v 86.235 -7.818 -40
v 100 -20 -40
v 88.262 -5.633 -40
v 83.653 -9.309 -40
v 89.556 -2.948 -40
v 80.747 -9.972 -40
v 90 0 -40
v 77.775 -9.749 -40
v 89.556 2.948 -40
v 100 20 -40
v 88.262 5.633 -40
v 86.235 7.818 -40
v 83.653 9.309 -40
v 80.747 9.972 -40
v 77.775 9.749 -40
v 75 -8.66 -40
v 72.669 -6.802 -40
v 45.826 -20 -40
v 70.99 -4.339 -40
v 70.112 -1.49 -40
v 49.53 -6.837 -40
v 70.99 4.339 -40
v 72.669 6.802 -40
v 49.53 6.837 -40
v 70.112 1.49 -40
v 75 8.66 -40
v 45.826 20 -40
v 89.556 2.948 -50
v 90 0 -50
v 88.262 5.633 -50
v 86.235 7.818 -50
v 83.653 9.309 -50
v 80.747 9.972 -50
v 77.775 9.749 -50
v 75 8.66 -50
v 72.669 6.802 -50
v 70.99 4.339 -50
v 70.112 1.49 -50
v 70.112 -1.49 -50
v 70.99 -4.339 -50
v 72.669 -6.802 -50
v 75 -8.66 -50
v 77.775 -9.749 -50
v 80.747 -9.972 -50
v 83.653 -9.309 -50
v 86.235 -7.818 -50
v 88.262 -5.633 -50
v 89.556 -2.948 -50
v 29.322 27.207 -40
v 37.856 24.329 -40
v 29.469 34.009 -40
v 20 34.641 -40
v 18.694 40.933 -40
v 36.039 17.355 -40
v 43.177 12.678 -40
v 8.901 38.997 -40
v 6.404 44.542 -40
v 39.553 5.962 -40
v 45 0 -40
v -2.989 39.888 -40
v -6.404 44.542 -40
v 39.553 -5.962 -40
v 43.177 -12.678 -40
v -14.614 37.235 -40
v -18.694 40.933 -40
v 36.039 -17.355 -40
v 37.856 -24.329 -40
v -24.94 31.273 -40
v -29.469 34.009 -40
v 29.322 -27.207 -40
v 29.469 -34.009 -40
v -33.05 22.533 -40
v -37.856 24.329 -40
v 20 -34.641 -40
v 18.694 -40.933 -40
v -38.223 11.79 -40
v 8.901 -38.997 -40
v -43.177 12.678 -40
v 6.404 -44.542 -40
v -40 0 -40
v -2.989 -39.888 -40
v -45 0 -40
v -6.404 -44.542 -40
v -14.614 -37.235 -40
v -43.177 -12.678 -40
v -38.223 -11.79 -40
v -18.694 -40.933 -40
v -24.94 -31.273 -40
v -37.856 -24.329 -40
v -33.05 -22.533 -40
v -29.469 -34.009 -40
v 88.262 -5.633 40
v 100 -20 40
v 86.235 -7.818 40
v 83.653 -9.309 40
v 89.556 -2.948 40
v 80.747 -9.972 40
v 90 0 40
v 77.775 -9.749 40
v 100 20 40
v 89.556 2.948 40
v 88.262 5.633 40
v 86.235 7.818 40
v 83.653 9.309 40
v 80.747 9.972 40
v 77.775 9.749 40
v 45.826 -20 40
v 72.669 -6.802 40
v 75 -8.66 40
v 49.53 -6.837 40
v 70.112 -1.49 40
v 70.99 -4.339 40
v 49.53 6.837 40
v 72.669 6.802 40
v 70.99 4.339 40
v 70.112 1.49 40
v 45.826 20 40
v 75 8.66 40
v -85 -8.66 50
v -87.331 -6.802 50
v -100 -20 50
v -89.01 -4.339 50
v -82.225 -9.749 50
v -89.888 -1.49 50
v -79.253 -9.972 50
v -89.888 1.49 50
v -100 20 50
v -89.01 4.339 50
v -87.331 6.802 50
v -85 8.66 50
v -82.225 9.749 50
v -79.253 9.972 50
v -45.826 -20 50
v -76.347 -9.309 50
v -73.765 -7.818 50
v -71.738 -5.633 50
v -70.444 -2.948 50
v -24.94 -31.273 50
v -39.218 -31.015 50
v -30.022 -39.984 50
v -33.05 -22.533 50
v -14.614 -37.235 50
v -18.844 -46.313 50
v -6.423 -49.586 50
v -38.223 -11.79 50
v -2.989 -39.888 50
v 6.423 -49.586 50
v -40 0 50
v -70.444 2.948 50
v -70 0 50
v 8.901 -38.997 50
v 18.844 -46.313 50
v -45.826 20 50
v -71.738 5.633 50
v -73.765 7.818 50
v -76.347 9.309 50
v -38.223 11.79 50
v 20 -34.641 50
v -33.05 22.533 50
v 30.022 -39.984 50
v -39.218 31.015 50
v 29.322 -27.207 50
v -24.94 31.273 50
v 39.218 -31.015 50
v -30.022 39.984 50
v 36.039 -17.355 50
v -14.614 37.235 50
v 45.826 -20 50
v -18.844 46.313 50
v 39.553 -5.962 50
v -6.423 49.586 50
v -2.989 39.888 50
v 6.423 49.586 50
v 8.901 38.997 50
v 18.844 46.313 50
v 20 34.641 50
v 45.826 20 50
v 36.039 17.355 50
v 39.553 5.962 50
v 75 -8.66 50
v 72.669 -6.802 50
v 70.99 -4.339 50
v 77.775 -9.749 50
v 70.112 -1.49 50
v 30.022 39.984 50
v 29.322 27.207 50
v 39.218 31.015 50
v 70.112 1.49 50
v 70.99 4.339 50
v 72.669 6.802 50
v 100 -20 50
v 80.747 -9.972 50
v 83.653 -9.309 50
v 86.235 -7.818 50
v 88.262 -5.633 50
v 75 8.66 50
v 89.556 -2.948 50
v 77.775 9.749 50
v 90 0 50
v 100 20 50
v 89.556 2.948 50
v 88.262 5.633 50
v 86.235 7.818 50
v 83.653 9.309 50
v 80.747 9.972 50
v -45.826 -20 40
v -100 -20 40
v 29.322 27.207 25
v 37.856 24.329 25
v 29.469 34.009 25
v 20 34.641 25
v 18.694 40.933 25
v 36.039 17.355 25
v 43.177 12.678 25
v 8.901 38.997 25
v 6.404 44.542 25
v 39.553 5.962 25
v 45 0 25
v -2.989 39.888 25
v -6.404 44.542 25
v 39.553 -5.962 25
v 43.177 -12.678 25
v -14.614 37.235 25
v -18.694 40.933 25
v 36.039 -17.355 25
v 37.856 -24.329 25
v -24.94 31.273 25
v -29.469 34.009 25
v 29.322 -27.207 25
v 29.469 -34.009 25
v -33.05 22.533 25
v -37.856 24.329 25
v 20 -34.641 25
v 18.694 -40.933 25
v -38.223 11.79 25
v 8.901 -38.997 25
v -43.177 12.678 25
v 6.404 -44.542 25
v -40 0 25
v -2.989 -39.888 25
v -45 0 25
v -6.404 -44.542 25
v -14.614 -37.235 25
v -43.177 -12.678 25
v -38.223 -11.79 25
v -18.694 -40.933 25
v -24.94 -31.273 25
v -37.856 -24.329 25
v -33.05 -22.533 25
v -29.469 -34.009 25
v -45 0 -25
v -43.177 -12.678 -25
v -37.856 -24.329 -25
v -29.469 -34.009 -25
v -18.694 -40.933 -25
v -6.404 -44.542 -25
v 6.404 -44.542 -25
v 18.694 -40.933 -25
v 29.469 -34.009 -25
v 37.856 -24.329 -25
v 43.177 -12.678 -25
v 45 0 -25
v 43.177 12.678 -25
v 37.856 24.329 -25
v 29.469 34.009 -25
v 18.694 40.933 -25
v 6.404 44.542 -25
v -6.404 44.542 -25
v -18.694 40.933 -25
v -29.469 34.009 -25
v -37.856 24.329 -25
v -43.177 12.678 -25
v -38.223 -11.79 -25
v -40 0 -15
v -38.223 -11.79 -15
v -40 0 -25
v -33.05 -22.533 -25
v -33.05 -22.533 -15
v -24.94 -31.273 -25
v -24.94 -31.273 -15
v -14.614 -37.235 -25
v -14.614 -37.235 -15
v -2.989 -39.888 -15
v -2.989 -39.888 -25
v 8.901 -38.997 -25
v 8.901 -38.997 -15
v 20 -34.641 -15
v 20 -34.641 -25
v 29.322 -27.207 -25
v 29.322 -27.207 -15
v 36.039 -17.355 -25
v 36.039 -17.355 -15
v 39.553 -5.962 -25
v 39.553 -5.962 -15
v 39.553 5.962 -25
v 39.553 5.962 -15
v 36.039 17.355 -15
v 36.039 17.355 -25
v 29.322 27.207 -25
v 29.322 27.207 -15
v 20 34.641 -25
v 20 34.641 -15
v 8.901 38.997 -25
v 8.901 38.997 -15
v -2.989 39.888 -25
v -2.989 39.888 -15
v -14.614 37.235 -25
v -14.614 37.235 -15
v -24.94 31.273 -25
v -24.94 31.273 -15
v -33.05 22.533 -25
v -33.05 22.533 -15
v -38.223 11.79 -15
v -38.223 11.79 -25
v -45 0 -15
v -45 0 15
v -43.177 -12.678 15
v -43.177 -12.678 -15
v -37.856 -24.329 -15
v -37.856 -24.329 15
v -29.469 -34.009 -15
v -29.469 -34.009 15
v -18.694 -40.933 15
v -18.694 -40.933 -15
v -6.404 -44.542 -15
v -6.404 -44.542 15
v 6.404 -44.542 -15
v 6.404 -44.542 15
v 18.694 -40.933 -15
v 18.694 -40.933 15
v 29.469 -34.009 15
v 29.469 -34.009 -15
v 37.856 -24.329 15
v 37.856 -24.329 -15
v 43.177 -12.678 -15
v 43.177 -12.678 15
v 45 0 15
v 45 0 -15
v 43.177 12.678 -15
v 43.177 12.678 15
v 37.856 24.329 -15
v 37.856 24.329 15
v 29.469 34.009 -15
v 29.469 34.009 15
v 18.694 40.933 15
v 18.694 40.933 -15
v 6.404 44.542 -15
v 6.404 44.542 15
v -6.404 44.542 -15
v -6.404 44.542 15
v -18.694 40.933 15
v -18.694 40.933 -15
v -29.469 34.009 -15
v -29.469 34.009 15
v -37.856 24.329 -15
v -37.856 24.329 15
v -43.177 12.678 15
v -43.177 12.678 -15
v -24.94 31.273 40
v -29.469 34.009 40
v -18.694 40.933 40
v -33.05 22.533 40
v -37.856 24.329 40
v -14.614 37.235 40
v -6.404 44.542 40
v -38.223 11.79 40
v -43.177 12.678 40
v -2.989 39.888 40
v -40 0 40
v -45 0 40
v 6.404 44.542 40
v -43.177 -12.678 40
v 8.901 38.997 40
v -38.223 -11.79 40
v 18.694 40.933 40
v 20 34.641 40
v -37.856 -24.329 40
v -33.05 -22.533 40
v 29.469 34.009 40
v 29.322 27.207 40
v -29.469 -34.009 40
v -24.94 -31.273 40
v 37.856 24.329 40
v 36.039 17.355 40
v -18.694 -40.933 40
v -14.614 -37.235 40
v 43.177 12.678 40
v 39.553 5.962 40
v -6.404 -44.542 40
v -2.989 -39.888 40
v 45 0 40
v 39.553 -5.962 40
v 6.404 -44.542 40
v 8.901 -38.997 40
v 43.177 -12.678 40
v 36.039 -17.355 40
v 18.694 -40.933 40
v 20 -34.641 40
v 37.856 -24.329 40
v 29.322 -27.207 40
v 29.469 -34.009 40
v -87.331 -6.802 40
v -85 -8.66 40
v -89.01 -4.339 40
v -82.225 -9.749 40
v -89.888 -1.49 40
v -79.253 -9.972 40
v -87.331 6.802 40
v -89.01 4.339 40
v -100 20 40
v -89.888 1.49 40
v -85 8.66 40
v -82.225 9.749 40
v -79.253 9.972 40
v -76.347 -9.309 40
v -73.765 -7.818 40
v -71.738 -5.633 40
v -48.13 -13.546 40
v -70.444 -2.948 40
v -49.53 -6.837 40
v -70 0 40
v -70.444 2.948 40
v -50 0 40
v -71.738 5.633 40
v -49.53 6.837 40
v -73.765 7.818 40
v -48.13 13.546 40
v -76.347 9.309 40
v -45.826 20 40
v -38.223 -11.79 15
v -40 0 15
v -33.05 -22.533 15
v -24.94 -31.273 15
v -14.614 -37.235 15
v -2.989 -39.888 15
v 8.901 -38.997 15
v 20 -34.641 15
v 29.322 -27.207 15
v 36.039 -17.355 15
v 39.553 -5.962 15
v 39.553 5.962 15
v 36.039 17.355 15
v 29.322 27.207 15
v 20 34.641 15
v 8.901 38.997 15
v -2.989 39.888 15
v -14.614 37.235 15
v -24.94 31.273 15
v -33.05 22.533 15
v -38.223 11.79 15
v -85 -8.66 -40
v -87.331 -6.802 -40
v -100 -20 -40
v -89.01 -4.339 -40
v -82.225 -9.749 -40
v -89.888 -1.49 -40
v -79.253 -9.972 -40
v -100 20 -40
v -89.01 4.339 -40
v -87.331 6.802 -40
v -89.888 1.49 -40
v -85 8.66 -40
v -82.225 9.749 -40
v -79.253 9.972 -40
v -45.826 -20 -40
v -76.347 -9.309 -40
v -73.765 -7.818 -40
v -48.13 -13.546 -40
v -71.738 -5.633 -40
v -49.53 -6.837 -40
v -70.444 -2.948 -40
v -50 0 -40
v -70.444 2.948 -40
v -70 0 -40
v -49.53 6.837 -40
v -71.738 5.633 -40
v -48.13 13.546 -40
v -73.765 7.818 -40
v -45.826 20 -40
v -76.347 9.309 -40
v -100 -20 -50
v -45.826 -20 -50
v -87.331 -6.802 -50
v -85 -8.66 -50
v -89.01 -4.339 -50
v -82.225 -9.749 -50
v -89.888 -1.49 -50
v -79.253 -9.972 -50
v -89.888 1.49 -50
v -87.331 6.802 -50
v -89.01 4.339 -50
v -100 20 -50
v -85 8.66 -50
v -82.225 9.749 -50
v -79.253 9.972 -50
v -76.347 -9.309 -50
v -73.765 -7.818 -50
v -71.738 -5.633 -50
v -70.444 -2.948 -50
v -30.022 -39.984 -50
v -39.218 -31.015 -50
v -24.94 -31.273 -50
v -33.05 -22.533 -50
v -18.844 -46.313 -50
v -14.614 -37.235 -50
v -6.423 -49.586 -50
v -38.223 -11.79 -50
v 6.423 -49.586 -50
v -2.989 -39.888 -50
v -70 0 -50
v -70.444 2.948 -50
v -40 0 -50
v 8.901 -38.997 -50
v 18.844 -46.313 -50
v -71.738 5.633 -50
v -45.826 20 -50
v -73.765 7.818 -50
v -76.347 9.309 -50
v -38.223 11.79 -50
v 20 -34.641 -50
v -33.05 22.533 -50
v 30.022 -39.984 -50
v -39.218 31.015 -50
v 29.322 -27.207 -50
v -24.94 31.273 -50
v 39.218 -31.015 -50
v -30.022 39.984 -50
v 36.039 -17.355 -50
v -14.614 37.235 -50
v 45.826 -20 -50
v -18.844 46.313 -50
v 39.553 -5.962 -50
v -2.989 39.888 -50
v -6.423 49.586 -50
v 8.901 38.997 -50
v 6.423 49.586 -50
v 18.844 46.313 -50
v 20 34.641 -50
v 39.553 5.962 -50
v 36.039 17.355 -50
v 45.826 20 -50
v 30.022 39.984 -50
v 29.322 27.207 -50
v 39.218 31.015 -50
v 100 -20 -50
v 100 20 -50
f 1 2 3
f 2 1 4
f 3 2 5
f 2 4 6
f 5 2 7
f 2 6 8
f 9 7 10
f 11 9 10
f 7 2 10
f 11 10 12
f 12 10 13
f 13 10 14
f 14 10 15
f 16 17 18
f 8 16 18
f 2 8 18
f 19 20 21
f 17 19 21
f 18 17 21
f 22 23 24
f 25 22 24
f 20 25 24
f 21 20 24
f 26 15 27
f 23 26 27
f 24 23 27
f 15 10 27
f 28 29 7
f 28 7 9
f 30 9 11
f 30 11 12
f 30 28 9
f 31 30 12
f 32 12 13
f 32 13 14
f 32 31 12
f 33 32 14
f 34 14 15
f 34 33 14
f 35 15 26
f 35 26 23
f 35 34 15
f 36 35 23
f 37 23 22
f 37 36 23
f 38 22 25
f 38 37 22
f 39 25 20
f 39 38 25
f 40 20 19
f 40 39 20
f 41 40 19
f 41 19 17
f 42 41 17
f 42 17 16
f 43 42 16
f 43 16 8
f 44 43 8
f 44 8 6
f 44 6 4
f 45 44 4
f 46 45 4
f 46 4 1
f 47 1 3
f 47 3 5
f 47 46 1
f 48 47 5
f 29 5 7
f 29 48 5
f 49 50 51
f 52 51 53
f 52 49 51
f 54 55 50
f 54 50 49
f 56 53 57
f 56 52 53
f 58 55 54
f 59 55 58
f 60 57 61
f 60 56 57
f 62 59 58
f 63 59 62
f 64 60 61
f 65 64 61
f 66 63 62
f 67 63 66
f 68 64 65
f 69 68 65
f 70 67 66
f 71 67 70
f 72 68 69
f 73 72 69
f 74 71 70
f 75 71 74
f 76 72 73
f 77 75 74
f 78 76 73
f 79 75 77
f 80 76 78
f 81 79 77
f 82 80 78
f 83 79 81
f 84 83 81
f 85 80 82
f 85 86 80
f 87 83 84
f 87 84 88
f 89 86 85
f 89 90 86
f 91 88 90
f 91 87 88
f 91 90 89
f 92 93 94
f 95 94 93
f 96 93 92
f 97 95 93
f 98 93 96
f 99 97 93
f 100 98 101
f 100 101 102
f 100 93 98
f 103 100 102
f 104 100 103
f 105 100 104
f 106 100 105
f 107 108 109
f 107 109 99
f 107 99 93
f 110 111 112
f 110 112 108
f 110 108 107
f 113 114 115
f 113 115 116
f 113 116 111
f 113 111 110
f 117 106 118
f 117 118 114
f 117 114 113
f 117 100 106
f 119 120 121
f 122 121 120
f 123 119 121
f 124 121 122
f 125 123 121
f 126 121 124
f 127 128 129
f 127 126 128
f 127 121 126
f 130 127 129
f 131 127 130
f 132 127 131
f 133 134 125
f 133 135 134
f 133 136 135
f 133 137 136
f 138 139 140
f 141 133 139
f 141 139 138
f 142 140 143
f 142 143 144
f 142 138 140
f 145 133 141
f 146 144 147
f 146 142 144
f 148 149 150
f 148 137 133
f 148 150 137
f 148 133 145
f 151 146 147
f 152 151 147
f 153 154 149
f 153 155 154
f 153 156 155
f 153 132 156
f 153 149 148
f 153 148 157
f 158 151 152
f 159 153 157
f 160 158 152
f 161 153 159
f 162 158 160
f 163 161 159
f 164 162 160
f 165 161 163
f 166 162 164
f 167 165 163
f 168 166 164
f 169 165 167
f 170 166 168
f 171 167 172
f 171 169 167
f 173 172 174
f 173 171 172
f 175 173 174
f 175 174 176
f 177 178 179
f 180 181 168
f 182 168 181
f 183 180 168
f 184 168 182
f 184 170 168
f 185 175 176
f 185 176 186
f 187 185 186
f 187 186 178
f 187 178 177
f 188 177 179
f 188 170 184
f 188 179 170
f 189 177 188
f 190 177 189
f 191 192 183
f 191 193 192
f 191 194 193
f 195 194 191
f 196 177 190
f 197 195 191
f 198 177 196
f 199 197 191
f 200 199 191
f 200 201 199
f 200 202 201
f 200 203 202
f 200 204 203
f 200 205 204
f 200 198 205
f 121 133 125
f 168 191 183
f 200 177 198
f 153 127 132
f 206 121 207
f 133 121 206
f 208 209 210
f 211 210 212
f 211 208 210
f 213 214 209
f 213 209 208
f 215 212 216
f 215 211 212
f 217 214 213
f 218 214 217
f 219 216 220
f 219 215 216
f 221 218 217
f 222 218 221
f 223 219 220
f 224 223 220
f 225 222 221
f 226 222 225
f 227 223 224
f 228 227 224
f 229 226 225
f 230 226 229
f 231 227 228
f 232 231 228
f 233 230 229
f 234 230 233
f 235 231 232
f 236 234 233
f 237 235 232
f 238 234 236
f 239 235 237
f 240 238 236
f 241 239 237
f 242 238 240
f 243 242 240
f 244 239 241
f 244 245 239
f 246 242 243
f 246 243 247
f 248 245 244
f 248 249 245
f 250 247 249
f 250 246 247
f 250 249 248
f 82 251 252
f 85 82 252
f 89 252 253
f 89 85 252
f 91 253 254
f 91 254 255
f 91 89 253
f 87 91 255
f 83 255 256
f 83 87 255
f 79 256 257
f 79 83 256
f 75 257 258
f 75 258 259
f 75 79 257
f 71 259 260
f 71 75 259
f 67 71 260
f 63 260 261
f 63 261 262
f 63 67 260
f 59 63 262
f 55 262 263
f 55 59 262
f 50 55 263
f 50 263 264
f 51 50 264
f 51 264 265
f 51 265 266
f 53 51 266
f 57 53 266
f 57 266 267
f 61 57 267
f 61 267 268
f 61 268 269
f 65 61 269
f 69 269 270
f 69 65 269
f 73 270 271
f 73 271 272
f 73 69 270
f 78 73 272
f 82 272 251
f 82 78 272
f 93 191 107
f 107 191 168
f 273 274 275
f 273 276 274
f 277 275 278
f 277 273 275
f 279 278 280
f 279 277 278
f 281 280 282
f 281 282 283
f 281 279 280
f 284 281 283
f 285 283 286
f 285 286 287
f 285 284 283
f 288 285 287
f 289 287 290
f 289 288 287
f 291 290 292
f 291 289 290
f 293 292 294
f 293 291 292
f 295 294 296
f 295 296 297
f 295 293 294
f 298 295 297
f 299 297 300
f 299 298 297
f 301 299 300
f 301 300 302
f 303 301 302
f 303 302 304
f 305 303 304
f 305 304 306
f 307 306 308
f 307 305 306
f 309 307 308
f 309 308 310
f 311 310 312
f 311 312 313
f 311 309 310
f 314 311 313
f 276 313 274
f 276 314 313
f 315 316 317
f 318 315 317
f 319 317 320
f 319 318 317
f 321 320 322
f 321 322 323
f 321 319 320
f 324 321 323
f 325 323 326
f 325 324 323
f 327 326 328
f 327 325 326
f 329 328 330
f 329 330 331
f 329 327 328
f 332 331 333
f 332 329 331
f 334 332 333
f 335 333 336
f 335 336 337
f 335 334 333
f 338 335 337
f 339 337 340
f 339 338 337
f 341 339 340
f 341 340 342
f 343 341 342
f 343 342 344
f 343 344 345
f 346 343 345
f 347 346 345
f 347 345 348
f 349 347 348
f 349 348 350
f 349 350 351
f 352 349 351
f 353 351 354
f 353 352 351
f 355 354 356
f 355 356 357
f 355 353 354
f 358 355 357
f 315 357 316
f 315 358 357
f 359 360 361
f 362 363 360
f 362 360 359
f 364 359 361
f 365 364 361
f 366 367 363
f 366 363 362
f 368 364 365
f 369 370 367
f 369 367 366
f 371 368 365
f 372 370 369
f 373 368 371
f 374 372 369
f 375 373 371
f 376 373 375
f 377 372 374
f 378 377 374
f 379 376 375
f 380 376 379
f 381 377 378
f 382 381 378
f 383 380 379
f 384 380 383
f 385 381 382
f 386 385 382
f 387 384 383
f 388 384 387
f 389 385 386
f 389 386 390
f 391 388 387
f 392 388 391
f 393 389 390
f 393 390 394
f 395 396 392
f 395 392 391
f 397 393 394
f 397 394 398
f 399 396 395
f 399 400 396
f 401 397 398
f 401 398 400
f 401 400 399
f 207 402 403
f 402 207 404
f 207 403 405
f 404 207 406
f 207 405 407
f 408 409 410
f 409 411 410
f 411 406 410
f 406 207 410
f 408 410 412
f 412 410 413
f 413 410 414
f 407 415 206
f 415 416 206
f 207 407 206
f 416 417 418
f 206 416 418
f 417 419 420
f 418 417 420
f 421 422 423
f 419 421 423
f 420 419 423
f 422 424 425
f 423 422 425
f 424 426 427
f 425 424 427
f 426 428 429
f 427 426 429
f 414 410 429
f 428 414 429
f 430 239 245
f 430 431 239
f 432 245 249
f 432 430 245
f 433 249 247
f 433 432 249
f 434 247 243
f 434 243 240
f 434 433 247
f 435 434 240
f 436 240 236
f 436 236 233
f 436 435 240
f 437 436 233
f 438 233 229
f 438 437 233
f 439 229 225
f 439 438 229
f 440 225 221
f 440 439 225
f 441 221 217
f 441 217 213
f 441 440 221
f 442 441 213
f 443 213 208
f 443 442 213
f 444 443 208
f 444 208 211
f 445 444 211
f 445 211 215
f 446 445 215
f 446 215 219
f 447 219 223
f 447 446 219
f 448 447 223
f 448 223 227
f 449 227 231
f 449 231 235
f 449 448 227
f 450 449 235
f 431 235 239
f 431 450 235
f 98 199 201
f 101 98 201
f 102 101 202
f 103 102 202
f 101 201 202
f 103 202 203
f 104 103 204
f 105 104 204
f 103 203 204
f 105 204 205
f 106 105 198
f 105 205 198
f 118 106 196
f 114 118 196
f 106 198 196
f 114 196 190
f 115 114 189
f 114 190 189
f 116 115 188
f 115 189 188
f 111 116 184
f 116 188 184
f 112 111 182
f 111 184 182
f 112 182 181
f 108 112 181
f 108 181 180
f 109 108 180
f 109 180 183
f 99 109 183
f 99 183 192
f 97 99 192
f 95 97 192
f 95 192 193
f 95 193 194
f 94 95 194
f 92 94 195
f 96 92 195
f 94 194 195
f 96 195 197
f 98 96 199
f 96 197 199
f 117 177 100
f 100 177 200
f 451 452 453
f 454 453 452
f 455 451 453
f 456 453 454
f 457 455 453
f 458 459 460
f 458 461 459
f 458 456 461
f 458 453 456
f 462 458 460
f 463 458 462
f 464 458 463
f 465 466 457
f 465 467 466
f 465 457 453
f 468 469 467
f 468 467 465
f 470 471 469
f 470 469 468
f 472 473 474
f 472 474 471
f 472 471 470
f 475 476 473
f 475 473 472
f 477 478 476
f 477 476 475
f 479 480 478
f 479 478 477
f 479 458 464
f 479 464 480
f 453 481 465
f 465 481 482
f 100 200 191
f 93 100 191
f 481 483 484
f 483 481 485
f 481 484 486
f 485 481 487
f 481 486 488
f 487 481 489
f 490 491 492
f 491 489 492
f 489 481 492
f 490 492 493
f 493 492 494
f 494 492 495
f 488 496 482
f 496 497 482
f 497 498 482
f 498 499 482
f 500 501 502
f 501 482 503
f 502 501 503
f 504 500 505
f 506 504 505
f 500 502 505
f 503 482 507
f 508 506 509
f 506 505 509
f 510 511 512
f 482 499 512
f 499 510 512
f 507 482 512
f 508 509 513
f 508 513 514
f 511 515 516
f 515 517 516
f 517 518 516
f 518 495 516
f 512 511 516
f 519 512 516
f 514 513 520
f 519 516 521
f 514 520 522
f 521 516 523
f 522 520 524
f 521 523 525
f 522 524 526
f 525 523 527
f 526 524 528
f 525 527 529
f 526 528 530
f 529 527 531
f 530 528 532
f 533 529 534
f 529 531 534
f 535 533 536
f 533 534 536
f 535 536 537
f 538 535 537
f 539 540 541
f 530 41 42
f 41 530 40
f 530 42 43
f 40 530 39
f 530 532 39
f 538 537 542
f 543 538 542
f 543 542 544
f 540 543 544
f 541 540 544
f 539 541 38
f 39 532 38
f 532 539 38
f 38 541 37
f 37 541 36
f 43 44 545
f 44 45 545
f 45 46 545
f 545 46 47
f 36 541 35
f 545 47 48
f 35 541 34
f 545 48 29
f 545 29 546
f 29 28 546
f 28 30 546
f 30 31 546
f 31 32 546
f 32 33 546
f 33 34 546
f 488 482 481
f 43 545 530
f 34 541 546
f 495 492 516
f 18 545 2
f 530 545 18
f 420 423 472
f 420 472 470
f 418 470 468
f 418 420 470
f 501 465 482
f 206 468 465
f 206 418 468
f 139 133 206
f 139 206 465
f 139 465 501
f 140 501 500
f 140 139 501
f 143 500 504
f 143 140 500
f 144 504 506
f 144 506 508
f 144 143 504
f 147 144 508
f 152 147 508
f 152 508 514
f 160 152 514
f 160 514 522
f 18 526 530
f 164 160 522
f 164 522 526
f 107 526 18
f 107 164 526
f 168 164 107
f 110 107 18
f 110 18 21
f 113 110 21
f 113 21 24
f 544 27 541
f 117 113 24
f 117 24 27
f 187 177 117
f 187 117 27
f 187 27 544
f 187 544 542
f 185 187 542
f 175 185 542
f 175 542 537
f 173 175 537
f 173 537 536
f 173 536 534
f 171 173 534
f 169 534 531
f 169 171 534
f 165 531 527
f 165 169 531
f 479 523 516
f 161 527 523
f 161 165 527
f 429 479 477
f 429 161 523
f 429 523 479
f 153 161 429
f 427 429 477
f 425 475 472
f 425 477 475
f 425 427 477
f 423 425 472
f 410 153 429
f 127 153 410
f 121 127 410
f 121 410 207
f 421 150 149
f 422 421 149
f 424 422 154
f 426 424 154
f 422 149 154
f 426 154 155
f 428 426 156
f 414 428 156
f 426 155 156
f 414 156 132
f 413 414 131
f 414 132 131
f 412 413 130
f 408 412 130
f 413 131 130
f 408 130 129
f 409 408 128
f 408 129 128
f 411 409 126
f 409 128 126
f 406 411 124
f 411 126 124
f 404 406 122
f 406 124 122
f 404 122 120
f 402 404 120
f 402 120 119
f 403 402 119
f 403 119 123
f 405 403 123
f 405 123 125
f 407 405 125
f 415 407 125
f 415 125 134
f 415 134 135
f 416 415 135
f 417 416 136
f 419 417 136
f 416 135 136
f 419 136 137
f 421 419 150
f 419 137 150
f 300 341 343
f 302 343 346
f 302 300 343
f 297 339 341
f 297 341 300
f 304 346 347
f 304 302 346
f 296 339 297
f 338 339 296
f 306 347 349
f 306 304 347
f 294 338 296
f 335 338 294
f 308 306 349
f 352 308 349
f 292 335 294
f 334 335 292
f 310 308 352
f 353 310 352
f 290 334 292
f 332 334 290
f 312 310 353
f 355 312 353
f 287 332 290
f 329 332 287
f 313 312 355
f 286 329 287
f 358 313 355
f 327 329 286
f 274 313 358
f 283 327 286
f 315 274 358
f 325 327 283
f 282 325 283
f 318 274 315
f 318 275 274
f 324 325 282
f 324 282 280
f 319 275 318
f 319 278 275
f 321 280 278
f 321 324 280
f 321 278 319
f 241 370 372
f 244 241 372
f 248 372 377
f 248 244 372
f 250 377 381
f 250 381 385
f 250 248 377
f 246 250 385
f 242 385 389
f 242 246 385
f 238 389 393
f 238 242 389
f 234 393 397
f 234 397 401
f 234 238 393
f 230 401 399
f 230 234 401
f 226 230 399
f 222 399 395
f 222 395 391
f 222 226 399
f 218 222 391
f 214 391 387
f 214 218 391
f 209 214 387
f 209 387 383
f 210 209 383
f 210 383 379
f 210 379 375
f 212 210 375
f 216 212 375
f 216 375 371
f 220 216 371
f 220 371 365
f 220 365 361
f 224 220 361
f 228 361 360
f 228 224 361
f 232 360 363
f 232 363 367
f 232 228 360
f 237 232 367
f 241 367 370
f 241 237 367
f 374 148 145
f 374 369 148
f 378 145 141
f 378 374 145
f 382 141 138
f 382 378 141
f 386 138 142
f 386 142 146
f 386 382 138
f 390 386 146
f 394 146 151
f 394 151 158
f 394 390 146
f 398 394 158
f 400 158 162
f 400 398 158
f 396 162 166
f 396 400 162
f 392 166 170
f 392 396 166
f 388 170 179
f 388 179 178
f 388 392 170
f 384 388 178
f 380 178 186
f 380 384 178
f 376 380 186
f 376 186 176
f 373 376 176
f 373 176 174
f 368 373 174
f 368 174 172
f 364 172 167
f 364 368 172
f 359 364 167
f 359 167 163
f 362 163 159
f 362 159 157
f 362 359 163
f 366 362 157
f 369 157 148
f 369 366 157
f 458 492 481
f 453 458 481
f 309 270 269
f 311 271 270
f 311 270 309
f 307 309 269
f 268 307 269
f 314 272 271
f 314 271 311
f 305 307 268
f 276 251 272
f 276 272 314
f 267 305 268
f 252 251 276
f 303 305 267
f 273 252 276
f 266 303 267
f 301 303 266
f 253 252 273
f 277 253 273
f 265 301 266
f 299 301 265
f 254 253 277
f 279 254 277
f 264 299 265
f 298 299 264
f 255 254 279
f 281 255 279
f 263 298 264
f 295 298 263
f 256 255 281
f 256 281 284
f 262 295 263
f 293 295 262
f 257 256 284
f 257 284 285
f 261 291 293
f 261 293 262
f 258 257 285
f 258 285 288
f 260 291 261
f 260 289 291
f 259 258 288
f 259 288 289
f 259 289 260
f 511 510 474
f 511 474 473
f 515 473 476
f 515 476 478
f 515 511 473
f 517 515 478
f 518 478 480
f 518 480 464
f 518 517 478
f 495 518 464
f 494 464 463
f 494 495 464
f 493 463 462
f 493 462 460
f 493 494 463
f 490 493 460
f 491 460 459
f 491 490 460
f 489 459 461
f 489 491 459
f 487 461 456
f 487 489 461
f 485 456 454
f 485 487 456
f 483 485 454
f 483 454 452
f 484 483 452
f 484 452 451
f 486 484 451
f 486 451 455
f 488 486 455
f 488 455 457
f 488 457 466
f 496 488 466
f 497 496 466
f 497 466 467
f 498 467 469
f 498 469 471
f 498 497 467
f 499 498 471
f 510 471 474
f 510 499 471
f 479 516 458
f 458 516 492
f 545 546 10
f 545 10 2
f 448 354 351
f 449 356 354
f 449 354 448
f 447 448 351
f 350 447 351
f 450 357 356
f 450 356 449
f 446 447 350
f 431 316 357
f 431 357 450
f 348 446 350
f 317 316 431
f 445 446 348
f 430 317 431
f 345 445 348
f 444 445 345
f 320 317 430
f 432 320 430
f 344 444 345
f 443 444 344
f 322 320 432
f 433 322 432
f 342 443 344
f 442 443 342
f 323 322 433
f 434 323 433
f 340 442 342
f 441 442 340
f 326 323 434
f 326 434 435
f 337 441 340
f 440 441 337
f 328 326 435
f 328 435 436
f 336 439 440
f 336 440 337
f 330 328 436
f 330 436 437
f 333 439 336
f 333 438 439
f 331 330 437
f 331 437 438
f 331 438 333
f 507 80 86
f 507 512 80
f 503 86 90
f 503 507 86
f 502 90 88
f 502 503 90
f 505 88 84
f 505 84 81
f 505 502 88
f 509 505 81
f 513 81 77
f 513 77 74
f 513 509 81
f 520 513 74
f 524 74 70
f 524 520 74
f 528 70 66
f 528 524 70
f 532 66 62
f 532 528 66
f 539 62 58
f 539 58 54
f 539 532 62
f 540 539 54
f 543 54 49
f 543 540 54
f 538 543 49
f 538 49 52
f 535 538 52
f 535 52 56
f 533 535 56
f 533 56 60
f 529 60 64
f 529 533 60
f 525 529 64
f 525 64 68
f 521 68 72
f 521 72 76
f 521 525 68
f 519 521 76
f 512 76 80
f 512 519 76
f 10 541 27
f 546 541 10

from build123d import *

# Parameters (mm, degrees)
SKETCH2_R           = 10
BOSS_EXTRUDE1_DEPTH = 10


with BuildPart() as part:
    # Sketch1 → Revolve1 (revolve)
    with BuildSketch(Plane(origin=(0, 0, 0), x_dir=(1, 0, 0), z_dir=(0, 1, 0))):
        Polygon((-50, 50), (-50, -50), (-45, -50), (-40, -50), (-40, -40), (-45, -40), (-45, -25), (-40, -25), (-40, -15), (-45, -15), (-45, 15), (-40, 15), (-40, 25), (-45, 25), (-45, 40), (-40, 40), (-40, 50), (-45, 50), align=None)
    revolve(axis=Axis((0, 0, -100.912408759), (0, 0, 1)))

    # Sketch2 → Boss-Extrude1 (add)
    # profile 1 of 2: a face of its own
    with BuildSketch(Plane.XY.offset(50)):
        with BuildLine():
            Line((45.82575695, 20), (100, 20))
            Line((100, 20), (100, -20))
            Line((100, -20), (45.82575695, -20))
            ThreePointArc((45.82575695, -20), (50, 0), (45.82575695, 20))
        make_face()
        with Locations((80, 0)):
            Circle(SKETCH2_R, mode=Mode.SUBTRACT)
    # profile 2 of 2: a face of its own
    with BuildSketch(Plane.XY.offset(50)):
        with BuildLine():
            Line((-100, 20), (-100, -20))
            Line((-100, -20), (-45.82575695, -20))
            ThreePointArc((-45.82575695, -20), (-50, 0), (-45.82575695, 20))
            Line((-45.82575695, 20), (-100, 20))
        make_face()
        with Locations((-80, 0)):
            Circle(SKETCH2_R, mode=Mode.SUBTRACT)
    boss_extrude1 = extrude(amount=-BOSS_EXTRUDE1_DEPTH)

    # Mirror1: Boss-Extrude1 across plane
    add(boss_extrude1.mirror(Plane.XY))


solid = part.part
